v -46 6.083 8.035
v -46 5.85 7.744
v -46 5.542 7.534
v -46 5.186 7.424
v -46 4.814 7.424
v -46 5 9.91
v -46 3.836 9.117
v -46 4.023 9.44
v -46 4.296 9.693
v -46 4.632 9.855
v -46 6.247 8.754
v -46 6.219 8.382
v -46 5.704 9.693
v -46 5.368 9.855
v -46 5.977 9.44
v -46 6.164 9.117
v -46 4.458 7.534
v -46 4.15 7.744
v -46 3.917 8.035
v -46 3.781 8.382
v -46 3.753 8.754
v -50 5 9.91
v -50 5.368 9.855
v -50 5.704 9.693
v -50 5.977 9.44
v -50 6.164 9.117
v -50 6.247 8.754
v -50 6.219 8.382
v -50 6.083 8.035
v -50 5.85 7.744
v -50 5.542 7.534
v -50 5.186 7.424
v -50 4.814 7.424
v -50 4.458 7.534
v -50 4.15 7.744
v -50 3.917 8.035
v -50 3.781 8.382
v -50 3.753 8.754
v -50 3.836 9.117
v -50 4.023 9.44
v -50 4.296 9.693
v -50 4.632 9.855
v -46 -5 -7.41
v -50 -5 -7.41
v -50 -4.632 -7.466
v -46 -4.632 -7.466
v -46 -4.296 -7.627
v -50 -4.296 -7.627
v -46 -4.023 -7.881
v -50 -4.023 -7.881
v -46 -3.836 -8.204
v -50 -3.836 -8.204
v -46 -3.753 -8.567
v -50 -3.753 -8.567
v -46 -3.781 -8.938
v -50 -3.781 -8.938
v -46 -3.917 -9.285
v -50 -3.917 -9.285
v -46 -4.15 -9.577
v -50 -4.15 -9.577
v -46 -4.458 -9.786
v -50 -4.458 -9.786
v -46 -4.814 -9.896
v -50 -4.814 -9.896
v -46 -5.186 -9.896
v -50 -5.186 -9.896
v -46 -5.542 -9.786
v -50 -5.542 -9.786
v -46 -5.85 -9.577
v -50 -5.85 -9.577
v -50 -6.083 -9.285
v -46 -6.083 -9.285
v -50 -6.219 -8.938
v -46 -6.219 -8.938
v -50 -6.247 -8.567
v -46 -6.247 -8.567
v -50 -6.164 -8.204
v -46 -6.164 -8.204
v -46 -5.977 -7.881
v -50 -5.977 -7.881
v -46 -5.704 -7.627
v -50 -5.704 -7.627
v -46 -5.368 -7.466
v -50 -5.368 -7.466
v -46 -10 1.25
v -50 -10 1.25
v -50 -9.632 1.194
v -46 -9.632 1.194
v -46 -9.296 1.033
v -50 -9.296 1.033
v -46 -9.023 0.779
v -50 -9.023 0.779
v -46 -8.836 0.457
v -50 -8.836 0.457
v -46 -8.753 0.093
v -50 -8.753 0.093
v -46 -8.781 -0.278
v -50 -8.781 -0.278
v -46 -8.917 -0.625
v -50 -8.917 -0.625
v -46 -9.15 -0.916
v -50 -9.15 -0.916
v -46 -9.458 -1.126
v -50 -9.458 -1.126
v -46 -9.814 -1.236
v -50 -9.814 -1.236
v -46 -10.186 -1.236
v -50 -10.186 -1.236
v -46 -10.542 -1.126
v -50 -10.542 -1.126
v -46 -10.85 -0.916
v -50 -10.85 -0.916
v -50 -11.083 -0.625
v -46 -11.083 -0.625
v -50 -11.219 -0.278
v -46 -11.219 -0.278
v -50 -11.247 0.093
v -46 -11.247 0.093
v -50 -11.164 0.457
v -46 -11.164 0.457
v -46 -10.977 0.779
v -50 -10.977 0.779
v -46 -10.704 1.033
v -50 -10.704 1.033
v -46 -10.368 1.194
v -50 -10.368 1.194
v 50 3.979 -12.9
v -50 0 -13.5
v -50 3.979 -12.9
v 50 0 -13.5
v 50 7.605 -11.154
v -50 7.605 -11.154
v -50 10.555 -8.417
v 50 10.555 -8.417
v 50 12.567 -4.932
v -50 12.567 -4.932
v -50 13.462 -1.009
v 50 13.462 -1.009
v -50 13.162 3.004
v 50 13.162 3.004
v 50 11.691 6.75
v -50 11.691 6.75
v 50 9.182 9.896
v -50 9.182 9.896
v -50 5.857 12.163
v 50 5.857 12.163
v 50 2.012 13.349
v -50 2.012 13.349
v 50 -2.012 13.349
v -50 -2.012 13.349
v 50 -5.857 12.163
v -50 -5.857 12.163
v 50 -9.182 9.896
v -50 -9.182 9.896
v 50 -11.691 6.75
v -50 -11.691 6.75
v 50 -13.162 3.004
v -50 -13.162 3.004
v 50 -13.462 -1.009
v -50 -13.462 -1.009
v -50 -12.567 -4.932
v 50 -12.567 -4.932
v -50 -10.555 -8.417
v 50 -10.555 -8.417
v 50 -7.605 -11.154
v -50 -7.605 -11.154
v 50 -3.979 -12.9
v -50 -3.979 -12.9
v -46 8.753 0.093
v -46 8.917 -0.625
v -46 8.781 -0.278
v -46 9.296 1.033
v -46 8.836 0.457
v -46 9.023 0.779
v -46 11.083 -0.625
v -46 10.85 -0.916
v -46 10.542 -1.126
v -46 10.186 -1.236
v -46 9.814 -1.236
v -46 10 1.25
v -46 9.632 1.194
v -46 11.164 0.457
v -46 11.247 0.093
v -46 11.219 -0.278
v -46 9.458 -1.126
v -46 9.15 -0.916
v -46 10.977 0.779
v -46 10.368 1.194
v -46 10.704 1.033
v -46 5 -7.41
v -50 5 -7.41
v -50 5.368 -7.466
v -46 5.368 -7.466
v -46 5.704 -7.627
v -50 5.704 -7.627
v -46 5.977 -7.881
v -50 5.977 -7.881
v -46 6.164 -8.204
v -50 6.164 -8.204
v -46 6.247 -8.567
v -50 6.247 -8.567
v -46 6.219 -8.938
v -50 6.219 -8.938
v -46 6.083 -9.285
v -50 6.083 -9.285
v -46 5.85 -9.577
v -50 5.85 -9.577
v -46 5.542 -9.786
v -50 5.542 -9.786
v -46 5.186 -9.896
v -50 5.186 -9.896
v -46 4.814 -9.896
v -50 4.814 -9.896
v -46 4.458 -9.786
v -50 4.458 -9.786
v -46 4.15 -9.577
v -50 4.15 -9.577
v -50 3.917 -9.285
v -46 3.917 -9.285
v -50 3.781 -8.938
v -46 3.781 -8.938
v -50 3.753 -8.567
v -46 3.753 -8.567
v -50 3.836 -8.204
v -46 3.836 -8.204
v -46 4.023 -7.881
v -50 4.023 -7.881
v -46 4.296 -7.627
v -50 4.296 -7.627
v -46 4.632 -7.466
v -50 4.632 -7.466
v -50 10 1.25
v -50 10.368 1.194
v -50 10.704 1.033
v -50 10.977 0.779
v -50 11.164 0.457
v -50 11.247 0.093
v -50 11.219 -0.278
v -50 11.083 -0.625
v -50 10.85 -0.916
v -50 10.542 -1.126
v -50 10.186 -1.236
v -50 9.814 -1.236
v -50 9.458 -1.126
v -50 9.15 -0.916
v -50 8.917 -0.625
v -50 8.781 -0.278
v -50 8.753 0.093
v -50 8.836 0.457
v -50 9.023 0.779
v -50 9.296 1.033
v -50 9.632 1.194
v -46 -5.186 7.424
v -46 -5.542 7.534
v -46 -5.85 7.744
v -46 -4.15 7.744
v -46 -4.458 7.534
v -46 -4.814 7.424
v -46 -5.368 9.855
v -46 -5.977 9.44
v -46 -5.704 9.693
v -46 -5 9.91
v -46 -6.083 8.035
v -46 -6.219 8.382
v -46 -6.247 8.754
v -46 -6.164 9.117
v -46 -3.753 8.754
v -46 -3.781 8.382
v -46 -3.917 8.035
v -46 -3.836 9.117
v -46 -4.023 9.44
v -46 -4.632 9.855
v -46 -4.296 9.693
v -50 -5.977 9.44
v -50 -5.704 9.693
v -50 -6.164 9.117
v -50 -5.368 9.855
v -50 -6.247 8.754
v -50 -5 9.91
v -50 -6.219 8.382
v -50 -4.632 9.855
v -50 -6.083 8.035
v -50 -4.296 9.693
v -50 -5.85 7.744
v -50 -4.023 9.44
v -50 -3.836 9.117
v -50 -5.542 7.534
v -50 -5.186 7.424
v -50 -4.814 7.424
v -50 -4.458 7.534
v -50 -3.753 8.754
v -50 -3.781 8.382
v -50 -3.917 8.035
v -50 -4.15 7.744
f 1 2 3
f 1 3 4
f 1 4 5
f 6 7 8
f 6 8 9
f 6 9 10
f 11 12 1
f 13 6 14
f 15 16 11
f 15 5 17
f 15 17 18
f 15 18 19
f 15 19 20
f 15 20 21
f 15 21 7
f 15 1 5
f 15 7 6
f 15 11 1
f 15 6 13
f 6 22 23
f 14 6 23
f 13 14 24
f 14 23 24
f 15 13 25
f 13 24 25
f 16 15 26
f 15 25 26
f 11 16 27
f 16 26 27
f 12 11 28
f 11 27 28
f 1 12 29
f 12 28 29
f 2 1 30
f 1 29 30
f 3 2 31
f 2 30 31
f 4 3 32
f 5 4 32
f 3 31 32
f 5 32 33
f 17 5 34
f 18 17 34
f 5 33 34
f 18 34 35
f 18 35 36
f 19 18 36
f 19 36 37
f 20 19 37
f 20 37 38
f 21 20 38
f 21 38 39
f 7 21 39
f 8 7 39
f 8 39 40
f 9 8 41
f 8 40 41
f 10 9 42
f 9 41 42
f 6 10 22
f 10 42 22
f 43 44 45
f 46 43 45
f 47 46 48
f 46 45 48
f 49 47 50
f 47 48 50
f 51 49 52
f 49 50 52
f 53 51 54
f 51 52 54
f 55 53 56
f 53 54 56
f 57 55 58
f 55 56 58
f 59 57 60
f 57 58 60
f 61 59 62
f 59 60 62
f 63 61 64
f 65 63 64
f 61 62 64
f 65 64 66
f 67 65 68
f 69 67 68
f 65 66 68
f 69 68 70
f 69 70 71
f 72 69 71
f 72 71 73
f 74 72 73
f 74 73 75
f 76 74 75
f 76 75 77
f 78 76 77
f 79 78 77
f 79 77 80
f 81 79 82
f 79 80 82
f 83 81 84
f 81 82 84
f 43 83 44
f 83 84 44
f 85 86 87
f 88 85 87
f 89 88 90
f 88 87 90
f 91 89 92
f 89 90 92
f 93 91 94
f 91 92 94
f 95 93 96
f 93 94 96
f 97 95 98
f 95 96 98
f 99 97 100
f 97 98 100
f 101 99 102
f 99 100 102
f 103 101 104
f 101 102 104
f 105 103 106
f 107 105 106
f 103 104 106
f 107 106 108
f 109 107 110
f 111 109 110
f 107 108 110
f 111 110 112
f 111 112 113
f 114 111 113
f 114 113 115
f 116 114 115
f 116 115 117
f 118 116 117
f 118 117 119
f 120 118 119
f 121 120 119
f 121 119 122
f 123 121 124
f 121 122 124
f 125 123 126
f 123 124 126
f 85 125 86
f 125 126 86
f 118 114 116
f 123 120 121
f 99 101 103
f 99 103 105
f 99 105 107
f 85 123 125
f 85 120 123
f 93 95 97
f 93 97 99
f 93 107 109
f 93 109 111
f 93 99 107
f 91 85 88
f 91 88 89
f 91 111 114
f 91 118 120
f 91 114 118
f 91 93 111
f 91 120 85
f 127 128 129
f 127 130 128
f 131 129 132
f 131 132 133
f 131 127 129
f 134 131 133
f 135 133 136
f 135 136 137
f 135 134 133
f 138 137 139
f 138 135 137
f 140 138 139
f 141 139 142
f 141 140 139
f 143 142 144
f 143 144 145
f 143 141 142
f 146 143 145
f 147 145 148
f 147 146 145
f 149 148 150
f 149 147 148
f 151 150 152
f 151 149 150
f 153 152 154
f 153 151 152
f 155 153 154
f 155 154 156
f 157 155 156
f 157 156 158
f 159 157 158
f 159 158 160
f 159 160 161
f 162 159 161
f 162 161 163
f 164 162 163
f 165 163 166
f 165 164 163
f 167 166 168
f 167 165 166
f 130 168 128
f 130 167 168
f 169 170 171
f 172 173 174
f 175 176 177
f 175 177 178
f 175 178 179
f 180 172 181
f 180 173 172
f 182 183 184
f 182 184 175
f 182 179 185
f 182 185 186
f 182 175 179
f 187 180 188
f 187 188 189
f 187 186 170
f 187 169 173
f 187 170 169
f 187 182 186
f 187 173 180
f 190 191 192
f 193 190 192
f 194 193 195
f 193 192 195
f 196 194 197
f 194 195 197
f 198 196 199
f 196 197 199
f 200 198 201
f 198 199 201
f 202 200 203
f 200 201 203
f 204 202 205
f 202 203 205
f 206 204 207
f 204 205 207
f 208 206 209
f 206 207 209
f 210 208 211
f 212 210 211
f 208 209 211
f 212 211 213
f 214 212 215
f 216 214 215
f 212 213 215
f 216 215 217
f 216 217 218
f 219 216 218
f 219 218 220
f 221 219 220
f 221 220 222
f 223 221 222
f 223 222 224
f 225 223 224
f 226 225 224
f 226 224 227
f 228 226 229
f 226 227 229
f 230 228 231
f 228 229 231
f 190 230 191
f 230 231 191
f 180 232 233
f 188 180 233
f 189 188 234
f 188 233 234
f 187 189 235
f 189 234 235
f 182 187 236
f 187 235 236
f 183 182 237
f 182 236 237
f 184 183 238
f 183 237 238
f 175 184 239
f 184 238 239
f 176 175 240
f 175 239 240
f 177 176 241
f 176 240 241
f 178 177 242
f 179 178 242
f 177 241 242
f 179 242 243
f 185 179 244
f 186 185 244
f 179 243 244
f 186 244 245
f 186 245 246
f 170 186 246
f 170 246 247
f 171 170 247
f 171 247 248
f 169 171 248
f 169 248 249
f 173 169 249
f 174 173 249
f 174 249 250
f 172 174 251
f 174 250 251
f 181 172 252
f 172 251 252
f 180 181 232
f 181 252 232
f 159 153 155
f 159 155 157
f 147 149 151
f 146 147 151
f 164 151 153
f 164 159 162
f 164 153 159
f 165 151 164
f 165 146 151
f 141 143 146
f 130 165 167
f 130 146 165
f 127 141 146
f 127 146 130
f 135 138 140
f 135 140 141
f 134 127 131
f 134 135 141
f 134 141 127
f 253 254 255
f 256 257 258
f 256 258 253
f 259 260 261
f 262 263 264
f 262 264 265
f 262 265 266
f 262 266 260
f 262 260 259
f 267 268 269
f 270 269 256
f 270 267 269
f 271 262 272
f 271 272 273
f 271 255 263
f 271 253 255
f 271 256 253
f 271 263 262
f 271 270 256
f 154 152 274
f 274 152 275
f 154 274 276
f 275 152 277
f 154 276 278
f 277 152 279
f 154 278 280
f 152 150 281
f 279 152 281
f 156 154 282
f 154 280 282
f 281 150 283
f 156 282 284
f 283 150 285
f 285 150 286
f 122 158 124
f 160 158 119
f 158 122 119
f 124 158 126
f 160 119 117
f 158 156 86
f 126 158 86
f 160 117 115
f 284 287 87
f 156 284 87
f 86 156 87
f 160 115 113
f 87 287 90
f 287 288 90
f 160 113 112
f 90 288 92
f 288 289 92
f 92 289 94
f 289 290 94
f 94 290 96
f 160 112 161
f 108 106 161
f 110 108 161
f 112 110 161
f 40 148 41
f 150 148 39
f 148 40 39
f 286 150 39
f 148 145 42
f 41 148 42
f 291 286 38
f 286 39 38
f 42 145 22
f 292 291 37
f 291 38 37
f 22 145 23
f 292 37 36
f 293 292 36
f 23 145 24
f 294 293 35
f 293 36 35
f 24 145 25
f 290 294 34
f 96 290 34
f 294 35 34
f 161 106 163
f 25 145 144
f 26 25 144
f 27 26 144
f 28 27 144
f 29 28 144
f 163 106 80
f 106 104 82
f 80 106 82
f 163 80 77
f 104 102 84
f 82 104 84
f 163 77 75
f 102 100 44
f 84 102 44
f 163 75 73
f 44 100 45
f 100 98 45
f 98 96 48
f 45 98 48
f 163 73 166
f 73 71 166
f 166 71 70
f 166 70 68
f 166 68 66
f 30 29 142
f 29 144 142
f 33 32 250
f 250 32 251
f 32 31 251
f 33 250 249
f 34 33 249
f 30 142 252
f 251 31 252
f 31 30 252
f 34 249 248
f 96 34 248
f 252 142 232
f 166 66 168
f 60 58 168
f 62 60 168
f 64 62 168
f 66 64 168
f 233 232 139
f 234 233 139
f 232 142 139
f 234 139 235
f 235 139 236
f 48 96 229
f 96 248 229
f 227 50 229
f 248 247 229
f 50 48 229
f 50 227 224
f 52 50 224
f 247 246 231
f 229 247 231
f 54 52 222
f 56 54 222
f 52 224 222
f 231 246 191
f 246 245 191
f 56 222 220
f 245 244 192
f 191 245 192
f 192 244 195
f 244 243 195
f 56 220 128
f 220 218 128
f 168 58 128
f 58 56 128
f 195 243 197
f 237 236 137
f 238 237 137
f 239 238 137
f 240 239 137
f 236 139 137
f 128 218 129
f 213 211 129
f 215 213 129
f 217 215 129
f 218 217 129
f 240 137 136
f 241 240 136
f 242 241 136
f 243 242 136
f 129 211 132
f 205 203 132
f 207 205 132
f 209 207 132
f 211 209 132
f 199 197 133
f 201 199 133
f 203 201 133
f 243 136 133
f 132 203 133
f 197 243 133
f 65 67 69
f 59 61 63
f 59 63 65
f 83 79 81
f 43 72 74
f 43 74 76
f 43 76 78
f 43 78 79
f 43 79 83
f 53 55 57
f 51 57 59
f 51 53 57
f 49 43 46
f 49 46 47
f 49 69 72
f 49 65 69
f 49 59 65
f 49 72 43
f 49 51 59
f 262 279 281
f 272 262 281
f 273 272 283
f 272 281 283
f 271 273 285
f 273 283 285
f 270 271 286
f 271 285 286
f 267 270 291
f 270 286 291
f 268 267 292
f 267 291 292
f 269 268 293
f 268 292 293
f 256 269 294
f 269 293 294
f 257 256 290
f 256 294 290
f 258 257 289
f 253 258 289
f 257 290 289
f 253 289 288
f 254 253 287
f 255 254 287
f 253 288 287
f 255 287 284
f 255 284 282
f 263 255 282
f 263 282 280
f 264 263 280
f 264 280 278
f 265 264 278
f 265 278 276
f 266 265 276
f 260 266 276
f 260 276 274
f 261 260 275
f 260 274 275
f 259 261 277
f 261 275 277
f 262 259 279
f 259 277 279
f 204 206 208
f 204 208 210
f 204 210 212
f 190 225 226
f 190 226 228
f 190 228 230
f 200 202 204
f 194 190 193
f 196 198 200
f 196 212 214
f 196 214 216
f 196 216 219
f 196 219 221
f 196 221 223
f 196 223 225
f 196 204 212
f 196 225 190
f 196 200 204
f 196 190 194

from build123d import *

# Parameters (mm, degrees)
SKETCH1_R           = 13.5
BOSS_EXTRUDE1_DEPTH = 50
SKETCH2_R           = 1.25
CUT_EXTRUDE1_DEPTH  = 4


with BuildPart() as part:
    # Sketch1 → Boss-Extrude1 (new, symmetric)
    with BuildSketch(Plane(origin=(0, 0, 0), x_dir=(0, 0, -1), z_dir=(1, 0, 0))):
        Circle(SKETCH1_R)
    extrude(amount=BOSS_EXTRUDE1_DEPTH, both=True)

    # Sketch2 → Cut-Extrude1 (cut)
    with BuildSketch(Plane.ZY.offset(50)):
        with Locations((0, 10)):
            Circle(SKETCH2_R)
        with Locations((8.660254038, 5)):
            Circle(SKETCH2_R)
        with Locations((8.660254038, -5)):
            Circle(SKETCH2_R)
        with Locations((0, -10)):
            Circle(SKETCH2_R)
        with Locations((-8.660254038, -5)):
            Circle(SKETCH2_R)
        with Locations((-8.660254038, 5)):
            Circle(SKETCH2_R)
    extrude(amount=-CUT_EXTRUDE1_DEPTH, mode=Mode.SUBTRACT)


solid = part.part
